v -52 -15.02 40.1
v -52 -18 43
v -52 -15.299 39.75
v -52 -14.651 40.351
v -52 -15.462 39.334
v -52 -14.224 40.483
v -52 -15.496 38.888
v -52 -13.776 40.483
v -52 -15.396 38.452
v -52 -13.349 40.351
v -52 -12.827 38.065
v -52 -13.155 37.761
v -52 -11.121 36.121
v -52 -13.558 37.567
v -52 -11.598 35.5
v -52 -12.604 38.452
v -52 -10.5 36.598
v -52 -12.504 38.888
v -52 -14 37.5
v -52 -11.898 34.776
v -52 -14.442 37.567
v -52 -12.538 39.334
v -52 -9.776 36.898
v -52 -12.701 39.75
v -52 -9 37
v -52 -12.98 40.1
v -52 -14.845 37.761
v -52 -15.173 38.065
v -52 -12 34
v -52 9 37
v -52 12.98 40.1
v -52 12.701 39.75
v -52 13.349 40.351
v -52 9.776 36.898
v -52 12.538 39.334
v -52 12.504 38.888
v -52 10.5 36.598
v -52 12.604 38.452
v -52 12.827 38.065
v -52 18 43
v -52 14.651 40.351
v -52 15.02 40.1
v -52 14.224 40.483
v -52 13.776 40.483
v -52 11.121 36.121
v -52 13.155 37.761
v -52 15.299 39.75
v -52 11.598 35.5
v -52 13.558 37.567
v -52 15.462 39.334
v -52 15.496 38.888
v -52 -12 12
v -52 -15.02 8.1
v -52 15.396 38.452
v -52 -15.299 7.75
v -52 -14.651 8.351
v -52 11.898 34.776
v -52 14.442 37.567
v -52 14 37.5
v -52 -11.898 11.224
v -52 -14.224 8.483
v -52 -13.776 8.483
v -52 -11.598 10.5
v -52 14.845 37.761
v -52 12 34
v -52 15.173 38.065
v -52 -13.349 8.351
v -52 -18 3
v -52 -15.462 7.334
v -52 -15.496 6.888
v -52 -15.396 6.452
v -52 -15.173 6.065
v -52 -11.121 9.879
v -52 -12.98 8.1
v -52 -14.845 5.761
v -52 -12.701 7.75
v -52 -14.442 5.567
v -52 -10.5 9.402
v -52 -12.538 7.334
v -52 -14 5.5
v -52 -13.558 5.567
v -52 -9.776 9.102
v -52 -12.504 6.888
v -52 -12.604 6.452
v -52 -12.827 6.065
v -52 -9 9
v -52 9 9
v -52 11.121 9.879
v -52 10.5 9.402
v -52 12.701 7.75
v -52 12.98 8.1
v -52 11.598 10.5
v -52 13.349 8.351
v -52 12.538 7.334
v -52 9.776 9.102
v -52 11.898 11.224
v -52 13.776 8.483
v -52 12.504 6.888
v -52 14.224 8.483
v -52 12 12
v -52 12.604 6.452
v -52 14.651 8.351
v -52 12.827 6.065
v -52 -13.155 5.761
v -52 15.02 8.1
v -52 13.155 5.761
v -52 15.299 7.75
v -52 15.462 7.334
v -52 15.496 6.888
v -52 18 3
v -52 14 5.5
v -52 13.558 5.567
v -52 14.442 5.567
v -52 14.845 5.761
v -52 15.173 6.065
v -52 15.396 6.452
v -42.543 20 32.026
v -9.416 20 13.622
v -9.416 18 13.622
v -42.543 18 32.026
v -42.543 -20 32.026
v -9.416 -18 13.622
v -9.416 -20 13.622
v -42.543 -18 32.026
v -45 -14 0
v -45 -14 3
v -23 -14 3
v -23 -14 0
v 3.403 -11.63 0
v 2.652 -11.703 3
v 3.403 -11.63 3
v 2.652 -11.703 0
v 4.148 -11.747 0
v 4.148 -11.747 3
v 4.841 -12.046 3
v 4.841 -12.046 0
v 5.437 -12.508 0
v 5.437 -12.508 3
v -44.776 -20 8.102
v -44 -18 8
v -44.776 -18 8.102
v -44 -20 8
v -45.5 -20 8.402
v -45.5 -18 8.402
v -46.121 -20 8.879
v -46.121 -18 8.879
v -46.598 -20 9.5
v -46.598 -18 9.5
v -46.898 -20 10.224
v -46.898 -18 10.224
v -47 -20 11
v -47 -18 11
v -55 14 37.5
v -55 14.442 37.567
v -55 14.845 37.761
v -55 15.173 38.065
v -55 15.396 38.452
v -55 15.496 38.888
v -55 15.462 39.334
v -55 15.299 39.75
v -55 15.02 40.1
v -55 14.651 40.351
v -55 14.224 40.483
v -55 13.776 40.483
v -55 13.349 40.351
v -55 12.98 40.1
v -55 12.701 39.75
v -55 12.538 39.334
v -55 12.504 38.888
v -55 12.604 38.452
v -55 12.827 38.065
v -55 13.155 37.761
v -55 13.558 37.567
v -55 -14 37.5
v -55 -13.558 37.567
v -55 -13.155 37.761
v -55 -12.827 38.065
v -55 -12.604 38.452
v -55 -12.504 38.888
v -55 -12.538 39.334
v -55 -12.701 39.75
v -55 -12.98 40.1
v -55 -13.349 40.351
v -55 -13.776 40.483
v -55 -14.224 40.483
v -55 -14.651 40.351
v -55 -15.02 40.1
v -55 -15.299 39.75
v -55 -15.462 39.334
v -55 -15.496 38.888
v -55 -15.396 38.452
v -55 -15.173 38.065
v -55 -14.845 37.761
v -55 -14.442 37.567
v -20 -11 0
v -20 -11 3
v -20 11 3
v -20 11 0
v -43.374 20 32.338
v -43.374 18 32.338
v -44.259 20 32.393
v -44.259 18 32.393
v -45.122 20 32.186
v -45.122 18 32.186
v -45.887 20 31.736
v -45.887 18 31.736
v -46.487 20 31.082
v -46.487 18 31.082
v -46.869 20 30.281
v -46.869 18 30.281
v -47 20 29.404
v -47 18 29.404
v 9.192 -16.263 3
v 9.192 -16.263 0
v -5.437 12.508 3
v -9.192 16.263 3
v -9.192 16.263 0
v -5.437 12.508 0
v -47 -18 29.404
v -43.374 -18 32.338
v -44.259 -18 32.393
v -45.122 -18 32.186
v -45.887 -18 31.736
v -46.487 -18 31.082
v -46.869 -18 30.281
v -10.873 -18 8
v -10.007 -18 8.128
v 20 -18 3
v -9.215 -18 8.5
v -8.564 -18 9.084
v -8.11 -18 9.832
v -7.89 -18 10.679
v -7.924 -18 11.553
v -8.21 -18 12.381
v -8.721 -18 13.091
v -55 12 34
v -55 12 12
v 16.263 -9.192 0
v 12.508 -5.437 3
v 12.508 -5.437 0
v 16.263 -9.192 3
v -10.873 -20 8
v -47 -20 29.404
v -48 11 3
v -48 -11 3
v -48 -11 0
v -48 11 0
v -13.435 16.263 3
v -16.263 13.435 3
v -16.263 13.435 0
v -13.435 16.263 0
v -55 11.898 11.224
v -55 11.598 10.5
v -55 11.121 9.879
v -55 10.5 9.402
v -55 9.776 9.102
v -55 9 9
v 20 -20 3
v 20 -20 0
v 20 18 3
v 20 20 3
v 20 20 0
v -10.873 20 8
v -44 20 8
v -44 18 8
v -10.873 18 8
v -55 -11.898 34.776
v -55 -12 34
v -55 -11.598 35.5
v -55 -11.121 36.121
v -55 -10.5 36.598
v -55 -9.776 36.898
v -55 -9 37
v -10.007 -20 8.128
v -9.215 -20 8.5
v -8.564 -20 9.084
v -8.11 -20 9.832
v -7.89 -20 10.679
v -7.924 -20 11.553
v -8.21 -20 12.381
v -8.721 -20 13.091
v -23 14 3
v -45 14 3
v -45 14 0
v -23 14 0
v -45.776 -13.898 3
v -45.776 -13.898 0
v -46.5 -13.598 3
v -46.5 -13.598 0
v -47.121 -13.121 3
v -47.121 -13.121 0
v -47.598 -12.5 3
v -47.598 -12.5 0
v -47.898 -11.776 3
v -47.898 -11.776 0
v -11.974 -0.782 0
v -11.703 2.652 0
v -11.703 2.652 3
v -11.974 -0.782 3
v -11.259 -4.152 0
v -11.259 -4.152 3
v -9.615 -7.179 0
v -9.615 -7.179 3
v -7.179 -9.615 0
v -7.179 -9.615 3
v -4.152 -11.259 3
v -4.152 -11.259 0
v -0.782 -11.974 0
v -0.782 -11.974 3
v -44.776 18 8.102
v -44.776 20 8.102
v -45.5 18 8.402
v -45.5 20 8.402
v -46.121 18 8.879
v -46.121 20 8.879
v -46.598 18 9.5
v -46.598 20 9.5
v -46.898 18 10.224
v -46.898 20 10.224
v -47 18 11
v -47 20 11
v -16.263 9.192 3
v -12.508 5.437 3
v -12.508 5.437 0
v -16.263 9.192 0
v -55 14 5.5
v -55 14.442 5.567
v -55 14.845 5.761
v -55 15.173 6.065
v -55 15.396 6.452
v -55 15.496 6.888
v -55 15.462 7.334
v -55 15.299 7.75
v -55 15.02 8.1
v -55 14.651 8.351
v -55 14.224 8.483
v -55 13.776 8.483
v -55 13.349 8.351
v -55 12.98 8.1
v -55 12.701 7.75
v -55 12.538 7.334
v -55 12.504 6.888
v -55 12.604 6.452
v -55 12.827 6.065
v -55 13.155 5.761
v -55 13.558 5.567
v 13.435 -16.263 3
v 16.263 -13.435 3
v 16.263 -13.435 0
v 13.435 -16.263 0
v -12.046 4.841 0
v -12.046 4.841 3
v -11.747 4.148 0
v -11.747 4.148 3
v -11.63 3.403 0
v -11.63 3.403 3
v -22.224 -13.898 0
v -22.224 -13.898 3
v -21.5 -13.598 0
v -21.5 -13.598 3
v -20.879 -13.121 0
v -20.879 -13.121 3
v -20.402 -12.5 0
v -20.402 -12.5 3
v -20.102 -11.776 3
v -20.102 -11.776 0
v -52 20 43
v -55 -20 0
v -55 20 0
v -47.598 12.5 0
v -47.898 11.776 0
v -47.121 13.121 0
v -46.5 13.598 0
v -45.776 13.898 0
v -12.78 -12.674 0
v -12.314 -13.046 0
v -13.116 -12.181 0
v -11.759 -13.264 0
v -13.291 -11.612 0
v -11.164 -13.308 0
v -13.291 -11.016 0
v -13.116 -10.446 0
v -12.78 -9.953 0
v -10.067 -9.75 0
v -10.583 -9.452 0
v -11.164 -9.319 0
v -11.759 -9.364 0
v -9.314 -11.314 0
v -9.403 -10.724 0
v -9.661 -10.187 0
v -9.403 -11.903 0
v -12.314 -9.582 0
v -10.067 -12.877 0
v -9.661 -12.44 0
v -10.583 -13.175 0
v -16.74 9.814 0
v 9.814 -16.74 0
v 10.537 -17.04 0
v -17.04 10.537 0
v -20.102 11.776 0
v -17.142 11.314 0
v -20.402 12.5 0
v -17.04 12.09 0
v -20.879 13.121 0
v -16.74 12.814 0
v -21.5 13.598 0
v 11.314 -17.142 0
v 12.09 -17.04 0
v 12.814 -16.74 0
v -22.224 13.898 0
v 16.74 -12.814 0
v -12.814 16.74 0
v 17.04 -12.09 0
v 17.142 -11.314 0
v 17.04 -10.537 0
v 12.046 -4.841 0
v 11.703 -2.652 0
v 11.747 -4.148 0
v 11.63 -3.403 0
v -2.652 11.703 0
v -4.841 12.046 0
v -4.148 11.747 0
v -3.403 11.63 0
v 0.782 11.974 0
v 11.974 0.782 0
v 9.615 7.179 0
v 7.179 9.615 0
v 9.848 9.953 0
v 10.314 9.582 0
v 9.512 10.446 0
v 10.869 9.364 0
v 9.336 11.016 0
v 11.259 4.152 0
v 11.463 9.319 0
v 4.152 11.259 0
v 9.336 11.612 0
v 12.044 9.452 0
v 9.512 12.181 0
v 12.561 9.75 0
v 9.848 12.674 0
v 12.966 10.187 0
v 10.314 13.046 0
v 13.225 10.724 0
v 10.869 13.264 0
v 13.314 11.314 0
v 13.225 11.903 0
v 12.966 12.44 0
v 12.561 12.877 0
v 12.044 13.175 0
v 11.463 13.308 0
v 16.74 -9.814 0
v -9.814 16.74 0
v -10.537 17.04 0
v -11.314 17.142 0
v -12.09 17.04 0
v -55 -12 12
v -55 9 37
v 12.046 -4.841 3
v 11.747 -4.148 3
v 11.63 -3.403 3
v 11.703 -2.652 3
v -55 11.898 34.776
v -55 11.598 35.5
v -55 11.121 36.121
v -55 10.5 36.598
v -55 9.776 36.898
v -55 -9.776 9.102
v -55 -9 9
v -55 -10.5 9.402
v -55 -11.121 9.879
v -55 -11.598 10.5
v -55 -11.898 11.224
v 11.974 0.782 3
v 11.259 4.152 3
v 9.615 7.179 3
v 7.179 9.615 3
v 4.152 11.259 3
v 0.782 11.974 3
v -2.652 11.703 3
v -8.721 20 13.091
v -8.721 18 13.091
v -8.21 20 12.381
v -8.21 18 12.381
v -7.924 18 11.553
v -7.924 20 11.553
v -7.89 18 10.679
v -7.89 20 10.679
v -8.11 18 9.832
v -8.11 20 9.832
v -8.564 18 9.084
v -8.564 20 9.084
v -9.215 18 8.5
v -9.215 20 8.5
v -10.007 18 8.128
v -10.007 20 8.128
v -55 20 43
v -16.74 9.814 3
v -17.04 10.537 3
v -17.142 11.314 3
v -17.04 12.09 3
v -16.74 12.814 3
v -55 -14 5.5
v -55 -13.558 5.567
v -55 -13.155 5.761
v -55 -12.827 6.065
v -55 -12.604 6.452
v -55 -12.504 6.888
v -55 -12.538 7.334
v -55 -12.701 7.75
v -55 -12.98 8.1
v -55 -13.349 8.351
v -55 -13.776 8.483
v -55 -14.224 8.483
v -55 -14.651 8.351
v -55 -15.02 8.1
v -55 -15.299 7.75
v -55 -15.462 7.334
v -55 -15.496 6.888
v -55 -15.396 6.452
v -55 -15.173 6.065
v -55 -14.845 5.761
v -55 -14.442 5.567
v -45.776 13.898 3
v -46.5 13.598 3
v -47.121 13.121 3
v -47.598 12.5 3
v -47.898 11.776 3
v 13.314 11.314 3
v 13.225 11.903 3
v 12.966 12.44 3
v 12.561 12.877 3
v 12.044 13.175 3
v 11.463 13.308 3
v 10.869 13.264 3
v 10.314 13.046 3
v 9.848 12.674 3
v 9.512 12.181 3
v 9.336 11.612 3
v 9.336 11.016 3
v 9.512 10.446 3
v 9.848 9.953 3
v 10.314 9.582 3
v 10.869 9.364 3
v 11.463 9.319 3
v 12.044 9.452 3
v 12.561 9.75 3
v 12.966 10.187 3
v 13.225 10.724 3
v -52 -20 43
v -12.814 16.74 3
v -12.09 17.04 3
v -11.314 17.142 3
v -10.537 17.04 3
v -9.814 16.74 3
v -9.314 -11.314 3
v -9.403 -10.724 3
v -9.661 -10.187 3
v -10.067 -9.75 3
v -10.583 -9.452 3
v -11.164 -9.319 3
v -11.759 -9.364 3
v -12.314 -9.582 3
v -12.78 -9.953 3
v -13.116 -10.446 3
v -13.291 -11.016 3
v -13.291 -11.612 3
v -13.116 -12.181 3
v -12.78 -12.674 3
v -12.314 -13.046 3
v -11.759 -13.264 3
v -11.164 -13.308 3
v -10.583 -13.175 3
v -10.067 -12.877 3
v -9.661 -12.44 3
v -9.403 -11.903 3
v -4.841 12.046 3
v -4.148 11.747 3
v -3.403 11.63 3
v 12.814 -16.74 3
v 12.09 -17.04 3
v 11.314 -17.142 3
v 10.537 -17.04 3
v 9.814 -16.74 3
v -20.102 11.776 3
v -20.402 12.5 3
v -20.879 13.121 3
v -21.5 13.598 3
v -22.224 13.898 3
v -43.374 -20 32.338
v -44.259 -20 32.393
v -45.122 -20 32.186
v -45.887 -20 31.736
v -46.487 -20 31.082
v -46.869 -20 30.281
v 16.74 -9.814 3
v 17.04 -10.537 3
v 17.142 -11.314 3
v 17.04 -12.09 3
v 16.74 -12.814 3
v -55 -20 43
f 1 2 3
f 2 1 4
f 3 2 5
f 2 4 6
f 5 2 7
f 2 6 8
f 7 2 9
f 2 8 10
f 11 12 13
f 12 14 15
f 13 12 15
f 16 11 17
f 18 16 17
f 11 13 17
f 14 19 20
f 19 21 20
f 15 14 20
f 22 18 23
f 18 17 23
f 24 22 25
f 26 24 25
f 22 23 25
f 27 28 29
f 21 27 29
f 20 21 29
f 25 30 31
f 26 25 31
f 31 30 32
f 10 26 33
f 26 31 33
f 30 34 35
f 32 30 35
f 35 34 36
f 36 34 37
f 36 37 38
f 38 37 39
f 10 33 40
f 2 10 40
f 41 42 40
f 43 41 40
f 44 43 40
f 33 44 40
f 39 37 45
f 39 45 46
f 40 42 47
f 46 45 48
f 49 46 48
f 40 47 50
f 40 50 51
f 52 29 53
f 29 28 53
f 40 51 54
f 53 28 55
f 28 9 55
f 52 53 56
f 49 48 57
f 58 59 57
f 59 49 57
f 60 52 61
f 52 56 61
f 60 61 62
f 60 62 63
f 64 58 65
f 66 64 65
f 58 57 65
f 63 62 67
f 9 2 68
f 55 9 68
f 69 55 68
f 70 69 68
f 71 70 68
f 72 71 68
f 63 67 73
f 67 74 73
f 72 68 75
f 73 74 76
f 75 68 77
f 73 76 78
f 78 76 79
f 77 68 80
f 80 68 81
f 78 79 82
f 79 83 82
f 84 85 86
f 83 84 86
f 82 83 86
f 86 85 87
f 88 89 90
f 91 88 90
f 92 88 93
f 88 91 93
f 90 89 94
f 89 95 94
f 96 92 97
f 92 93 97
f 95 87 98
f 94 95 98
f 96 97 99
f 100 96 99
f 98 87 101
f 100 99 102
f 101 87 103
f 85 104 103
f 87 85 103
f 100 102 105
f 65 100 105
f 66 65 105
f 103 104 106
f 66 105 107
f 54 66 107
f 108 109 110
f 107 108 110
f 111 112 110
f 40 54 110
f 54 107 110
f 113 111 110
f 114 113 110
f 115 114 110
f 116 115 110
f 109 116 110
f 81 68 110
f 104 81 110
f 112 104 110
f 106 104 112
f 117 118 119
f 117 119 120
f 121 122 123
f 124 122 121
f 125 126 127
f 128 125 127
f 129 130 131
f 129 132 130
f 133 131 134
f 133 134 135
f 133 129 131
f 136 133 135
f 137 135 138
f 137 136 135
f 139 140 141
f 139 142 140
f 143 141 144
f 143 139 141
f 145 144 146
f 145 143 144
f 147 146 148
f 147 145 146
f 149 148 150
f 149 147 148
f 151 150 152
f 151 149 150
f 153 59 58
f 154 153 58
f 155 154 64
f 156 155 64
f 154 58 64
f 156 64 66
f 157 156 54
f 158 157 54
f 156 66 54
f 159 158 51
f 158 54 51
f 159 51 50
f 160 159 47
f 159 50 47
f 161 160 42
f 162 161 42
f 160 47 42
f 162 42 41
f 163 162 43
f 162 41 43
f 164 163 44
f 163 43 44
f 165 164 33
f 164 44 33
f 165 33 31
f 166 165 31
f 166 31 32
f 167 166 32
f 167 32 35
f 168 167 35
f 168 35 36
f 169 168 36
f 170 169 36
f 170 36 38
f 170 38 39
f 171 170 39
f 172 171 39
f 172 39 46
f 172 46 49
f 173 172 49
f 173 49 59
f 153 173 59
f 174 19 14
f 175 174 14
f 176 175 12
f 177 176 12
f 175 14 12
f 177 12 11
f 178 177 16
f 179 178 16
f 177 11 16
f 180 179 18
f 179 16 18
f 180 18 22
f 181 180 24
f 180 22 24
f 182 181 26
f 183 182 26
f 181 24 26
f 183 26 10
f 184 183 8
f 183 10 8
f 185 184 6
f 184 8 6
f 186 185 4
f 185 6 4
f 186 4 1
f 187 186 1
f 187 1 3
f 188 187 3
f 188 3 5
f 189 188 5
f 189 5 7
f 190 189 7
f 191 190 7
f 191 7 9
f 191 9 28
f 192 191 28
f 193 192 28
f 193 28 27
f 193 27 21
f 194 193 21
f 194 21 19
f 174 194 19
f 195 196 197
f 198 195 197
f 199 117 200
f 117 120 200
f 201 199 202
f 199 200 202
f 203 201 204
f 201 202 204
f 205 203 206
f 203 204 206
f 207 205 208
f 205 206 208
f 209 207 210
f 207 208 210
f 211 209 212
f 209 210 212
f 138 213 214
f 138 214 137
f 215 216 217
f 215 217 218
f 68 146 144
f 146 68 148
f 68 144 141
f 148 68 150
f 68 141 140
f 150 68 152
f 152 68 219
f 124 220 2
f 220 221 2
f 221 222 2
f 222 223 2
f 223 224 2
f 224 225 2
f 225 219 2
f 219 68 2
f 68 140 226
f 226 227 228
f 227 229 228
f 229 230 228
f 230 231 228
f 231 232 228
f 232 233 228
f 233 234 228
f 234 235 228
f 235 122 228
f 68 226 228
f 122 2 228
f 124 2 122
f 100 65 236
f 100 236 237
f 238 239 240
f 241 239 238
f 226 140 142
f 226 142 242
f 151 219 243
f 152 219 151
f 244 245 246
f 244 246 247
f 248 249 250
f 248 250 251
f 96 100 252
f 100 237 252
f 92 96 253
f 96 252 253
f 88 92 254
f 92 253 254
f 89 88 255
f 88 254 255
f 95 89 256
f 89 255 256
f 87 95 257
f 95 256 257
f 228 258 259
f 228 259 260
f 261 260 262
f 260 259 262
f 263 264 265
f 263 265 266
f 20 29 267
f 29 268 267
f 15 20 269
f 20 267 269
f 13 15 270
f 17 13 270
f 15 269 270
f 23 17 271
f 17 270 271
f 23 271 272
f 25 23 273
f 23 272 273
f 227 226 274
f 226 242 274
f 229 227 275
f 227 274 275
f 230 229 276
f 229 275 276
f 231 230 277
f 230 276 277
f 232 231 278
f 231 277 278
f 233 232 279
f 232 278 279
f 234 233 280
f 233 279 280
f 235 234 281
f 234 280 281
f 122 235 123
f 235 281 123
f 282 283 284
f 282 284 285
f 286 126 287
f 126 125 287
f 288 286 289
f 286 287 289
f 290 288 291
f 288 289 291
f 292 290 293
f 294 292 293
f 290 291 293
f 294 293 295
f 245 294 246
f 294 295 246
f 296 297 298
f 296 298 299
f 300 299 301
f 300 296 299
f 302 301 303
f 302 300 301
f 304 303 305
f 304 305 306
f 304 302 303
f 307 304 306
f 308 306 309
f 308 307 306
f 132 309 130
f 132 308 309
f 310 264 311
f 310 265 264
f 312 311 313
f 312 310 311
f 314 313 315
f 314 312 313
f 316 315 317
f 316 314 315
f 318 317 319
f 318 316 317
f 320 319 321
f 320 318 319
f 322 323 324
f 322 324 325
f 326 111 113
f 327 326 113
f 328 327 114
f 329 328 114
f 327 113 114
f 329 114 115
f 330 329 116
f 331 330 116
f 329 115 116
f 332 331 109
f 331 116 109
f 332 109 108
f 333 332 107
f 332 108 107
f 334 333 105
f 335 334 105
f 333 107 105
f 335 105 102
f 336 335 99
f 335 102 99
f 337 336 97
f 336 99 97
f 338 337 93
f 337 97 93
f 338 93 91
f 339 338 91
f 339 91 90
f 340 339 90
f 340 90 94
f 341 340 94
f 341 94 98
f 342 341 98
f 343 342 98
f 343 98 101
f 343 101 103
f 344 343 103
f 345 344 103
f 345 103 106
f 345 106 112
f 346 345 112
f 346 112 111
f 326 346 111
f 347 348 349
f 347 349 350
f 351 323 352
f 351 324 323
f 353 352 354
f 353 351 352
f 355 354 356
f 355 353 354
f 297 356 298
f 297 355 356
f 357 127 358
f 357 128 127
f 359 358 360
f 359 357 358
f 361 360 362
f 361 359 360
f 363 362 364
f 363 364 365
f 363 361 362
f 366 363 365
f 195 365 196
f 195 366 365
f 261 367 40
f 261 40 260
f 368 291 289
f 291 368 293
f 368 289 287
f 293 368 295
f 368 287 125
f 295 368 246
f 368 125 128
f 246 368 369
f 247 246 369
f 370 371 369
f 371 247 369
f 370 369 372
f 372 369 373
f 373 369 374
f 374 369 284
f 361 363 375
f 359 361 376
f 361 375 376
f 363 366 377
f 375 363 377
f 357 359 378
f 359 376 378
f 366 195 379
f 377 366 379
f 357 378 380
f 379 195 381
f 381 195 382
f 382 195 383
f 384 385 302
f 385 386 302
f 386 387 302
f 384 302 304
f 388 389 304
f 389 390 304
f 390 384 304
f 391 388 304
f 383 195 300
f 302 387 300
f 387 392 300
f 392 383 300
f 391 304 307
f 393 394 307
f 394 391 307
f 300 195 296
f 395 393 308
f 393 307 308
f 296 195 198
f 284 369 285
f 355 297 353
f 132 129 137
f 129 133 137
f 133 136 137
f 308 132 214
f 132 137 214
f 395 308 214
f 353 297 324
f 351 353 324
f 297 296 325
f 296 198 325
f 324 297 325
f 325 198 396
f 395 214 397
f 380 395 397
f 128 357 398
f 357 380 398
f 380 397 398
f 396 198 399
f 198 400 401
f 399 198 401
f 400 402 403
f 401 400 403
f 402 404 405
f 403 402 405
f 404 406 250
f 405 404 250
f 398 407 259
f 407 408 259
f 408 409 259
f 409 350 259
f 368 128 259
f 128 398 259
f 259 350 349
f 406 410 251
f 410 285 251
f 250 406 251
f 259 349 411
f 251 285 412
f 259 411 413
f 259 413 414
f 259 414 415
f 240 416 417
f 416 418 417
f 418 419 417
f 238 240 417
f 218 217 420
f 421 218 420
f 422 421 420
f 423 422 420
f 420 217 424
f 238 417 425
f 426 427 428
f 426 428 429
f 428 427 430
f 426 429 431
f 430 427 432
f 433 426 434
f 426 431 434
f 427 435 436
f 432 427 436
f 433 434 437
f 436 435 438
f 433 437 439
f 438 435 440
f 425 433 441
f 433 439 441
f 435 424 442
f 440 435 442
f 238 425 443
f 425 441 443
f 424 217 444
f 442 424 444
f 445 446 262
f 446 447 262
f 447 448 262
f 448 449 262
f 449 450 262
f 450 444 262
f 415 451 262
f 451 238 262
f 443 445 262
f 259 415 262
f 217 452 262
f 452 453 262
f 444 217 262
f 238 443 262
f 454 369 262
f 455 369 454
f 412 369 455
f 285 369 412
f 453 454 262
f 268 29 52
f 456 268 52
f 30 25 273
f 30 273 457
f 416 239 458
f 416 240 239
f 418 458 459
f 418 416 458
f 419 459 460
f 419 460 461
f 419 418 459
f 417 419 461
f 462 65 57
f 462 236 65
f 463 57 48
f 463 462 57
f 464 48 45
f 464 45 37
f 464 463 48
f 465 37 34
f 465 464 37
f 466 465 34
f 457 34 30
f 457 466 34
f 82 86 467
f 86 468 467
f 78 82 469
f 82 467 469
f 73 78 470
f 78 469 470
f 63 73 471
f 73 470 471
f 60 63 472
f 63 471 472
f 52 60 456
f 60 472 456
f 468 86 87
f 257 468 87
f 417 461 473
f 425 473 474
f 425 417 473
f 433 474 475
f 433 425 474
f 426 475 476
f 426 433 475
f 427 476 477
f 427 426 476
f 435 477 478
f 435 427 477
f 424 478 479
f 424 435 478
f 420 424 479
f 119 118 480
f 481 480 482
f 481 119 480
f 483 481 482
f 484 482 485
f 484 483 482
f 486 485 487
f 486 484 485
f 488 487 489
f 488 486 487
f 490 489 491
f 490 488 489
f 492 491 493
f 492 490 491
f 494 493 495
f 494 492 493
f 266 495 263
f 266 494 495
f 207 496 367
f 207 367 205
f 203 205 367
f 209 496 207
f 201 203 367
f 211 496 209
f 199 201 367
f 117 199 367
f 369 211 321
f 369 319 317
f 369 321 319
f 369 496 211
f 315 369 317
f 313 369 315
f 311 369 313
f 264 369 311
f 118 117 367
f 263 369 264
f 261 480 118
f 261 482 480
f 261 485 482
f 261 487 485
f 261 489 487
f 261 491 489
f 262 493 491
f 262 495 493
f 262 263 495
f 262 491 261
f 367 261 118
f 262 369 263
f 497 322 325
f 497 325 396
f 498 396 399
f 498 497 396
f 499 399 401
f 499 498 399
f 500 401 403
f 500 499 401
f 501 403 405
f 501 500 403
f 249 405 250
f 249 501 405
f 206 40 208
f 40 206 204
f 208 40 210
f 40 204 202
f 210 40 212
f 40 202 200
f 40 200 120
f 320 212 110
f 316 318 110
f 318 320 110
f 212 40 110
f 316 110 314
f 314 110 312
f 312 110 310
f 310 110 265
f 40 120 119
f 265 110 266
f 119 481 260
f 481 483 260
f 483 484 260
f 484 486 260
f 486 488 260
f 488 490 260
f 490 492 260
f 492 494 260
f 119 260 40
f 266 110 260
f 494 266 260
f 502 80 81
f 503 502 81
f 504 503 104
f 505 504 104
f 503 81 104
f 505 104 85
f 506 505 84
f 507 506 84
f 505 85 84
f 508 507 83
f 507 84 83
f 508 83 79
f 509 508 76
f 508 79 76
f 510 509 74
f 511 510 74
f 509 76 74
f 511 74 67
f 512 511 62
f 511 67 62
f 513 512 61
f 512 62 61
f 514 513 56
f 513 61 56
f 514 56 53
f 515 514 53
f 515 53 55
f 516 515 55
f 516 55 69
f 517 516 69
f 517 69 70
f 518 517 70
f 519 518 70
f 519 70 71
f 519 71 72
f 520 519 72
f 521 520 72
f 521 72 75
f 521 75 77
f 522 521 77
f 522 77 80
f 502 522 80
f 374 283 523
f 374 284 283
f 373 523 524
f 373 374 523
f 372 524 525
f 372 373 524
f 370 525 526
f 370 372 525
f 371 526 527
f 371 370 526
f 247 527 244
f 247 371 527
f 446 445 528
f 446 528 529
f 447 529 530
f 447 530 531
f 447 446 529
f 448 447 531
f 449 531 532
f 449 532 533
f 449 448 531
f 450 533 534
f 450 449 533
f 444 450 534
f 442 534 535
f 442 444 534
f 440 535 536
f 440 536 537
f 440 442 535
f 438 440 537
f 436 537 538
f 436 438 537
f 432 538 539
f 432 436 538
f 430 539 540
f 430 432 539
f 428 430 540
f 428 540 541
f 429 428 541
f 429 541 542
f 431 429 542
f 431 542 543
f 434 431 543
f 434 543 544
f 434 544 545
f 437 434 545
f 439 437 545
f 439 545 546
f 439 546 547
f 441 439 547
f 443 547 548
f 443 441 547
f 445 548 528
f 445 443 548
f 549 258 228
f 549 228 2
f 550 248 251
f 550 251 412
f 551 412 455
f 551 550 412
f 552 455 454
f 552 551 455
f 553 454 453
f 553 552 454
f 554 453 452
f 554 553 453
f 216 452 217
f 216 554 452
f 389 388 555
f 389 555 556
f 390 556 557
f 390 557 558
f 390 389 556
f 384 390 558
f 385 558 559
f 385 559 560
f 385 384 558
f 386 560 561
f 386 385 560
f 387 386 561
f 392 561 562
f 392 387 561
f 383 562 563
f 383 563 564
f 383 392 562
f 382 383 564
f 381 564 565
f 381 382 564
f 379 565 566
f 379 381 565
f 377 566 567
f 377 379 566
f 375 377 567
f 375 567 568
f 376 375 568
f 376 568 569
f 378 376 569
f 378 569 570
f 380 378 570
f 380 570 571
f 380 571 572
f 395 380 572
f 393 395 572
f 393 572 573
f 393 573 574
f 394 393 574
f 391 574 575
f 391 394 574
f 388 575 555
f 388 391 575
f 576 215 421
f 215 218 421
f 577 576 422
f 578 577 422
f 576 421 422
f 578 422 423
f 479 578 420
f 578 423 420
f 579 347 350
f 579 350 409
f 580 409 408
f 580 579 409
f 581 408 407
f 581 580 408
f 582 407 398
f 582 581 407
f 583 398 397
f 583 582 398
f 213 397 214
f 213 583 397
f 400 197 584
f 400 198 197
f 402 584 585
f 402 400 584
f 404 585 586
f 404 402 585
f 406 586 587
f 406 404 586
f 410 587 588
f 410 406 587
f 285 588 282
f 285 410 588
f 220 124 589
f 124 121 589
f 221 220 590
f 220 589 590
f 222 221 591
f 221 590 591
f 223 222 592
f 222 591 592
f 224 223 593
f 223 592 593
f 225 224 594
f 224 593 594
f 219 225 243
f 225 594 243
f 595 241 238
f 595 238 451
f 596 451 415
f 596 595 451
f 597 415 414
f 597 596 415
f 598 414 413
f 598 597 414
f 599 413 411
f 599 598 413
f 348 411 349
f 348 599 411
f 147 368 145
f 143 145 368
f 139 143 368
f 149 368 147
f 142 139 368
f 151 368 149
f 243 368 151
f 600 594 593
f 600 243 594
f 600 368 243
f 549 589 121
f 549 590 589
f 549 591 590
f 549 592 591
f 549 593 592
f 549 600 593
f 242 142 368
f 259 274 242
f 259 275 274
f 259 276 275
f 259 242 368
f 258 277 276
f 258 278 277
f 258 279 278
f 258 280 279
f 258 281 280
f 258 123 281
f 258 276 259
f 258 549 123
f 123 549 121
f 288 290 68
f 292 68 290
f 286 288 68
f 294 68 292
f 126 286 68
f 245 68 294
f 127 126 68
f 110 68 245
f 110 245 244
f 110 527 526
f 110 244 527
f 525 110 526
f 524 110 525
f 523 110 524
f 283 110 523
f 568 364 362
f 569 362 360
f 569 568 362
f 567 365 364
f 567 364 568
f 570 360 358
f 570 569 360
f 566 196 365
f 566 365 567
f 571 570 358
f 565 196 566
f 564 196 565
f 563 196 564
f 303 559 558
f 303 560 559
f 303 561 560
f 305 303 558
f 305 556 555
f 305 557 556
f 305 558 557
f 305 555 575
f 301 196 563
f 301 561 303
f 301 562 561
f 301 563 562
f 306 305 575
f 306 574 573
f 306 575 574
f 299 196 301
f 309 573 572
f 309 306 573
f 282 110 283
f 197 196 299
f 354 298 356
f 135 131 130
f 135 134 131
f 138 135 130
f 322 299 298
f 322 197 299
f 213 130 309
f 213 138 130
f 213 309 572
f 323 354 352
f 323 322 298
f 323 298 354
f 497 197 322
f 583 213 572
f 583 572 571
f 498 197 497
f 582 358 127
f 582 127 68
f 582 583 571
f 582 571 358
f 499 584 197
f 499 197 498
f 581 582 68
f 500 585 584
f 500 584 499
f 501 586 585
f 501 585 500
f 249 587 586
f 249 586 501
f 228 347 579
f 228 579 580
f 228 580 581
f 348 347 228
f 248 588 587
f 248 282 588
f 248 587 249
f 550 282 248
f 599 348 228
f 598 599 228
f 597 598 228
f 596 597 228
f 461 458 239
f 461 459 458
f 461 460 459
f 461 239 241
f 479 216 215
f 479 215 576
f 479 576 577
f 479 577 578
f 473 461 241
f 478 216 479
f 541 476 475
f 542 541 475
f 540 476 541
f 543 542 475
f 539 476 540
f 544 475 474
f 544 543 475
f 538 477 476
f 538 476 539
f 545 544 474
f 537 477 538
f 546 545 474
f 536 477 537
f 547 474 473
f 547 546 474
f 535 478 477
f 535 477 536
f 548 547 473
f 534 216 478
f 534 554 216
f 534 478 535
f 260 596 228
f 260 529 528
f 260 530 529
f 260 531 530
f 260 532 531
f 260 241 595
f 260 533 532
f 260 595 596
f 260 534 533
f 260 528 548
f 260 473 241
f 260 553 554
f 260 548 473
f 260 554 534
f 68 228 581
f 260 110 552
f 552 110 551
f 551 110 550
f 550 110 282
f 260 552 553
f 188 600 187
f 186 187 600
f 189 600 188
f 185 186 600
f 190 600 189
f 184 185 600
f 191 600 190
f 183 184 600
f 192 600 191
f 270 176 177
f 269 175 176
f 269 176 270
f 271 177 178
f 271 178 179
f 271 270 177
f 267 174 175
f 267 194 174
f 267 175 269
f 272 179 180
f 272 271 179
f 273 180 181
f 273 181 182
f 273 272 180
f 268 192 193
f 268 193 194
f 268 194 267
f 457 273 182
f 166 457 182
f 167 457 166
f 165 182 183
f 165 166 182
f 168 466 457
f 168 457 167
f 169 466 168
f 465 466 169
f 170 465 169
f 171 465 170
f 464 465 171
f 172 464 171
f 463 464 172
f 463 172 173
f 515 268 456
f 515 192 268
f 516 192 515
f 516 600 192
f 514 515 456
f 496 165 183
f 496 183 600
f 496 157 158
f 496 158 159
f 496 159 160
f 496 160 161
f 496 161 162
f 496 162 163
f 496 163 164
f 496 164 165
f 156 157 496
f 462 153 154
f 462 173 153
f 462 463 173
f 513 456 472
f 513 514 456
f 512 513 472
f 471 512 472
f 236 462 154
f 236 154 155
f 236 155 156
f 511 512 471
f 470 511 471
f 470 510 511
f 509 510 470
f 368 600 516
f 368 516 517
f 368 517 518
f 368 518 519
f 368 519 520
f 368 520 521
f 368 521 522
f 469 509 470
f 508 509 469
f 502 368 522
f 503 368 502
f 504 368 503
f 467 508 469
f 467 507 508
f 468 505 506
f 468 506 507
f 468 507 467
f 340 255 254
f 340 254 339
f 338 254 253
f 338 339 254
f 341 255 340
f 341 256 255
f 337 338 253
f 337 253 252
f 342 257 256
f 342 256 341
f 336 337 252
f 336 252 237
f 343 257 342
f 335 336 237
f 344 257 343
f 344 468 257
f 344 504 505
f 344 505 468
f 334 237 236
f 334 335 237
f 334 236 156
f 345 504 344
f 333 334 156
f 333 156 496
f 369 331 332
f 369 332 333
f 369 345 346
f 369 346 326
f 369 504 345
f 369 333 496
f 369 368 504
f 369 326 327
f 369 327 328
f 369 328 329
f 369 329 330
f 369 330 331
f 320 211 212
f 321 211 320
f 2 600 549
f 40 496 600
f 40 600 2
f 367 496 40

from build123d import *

# Parameters (mm, degrees)
SKETCH_1_W          = 40
SKETCH_1_H          = 40
SKETCH_1_R          = 2
SKETCH_1_R_2        = 12
EXTRUDE_1_DEPTH     = 3
SKETCH_2_W          = 35
SKETCH_2_H          = 40
EXTRUDE_2_DEPTH     = 3
SKETCH_3_W          = 3
SKETCH_3_H          = 40
EXTRUDE_3_DEPTH     = 40
EXTRUDE_4_DEPTH     = 2
EXTRUDE_5_DEPTH     = 2
SKETCH_6_R          = 1.5
SKETCH_6_W          = 28
SKETCH_6_H          = 24
CUT_EXTRUDE_1_DEPTH = 12
FILLET_1_R          = 3
SKETCH_7_W          = 28
SKETCH_7_H          = 28
CUT_EXTRUDE_2_DEPTH = 12
FILLET_2_R          = 3
CUT_EXTRUDE_3_DEPTH = 49
FILLET_3_R          = 3
FILLET_4_R          = 3
CUT_EXTRUDE_4_DEPTH = 10
FILLET_5_R          = 3


with BuildPart() as part:
    # 草图1 → 凸台-拉伸1 (new body)
    with BuildSketch(Plane.XY):
        Rectangle(SKETCH_1_W, SKETCH_1_H)
        with Locations((11.313708499, 11.313708499)):
            Circle(SKETCH_1_R, mode=Mode.SUBTRACT)
        with Locations((11.313708499, -11.313708499)):
            Circle(SKETCH_1_R, mode=Mode.SUBTRACT)
        with Locations((-11.313708499, -11.313708499)):
            Circle(SKETCH_1_R, mode=Mode.SUBTRACT)
        with Locations((-11.313708499, 11.313708499)):
            Circle(SKETCH_1_R, mode=Mode.SUBTRACT)
        Circle(SKETCH_1_R_2, mode=Mode.SUBTRACT)
    extrude(amount=EXTRUDE_1_DEPTH)

    # 草图2 → 凸台-拉伸2 (add)
    with BuildSketch(Plane.XY.offset(3)):
        with Locations((-37.5, 0)):
            Rectangle(SKETCH_2_W, SKETCH_2_H)
    extrude(amount=-EXTRUDE_2_DEPTH)

    # 草图3 → 凸台-拉伸3 (add)
    with BuildSketch(Plane.XY.offset(3)):
        with Locations((-53.5, 0)):
            Rectangle(SKETCH_3_W, SKETCH_3_H)
    extrude(amount=EXTRUDE_3_DEPTH)

    # 草图4 → 凸台-拉伸4 (add)
    with BuildSketch(Plane(origin=(0, 20, 0), x_dir=(1, 0, 0), z_dir=(0, 1, 0))):
        Polygon((-52, -43), (20, -3), (-52, -3), align=None)
    extrude(amount=-EXTRUDE_4_DEPTH)

    # 草图5 → 凸台-拉伸5 (add)
    with BuildSketch(Plane.XZ.offset(20)):
        Polygon((-52, 43), (-52, 3), (20, 3), align=None)
    extrude(amount=-EXTRUDE_5_DEPTH)

    # 草图6 → 切除-拉伸1 (cut)
    with BuildSketch(Plane(origin=(-52, 0, 0), x_dir=(0, 0, -1), z_dir=(1, 0, 0))):
        with Locations((-39, 14)):
            Circle(SKETCH_6_R)
        with Locations((-7, 14)):
            Circle(SKETCH_6_R)
        with Locations((-7, -14)):
            Circle(SKETCH_6_R)
        with Locations((-39, -14)):
            Circle(SKETCH_6_R)
        with Locations((-23, 0)):
            Rectangle(SKETCH_6_W, SKETCH_6_H)
    extrude(amount=-CUT_EXTRUDE_1_DEPTH, mode=Mode.SUBTRACT)

    # 圆角1
    fillet_1_edges = [part.edges().sort_by_distance(p)[0] for p in [
        (-53.5, -12, 37),
        (-53.5, 12, 37),
        (-53.5, 12, 9),
        (-53.5, -12, 9),
    ]]
    fillet(fillet_1_edges, radius=FILLET_1_R)

    # 草图7 → 切除-拉伸2 (cut)
    with BuildSketch(Plane.XY.offset(3)):
        with Locations((-34, 0)):
            Rectangle(SKETCH_7_W, SKETCH_7_H)
    extrude(amount=-CUT_EXTRUDE_2_DEPTH, mode=Mode.SUBTRACT)

    # 圆角2
    fillet_2_edges = [part.edges().sort_by_distance(p)[0] for p in [
        (-20, 14, 1.5),
        (-20, -14, 1.5),
        (-48, -14, 1.5),
        (-48, 14, 1.5),
    ]]
    fillet(fillet_2_edges, radius=FILLET_2_R)

    # 草图8 → 切除-拉伸3 (cut)
    with BuildSketch(Plane(origin=(0, 20, 0), x_dir=(1, 0, 0), z_dir=(0, 1, 0))):
        Polygon((-47, -34.502427699), (-47, -8), (0.704369859, -8), align=None)
    extrude(amount=-CUT_EXTRUDE_3_DEPTH, mode=Mode.SUBTRACT)

    # 圆角3
    fillet_3_edges = [part.edges().sort_by_distance(p)[0] for p in [
        (0.704369859, 19, 8),
        (-47, 19, 34.502427699),
        (-47, 19, 8),
    ]]
    fillet(fillet_3_edges, radius=FILLET_3_R)

    # 圆角4
    fillet_4_edges = [part.edges().sort_by_distance(p)[0] for p in [
        (0.704369859, -19, 8),
        (-47, -19, 34.502427699),
        (-47, -19, 8),
    ]]
    fillet(fillet_4_edges, radius=FILLET_4_R)

    # 草图9 → 切除-拉伸4 (cut)
    with BuildSketch(Plane.XY.offset(3)):
        with BuildLine():
            Line((-4.949747468, 12.02081528), (-1.998451999, 9.069519811))
            Line((-1.998451999, 9.069519811), (12.02081528, -4.949747468))
            Line((12.02081528, -4.949747468), (16.263455967, -9.192388155))
            ThreePointArc((16.263455967, -9.192388155), (17.142135624, -11.313708499), (16.263455967, -13.435028843))
            Line((16.263455967, -13.435028843), (13.435028843, -16.263455967))
            ThreePointArc((13.435028843, -16.263455967), (11.313708499, -17.142135624), (9.192388155, -16.263455967))
            Line((9.192388155, -16.263455967), (4.949747468, -12.02081528))
            Line((4.949747468, -12.02081528), (-9.069519811, 1.998451999))
            Line((-9.069519811, 1.998451999), (-12.02081528, 4.949747468))
            Line((-12.02081528, 4.949747468), (-16.263455967, 9.192388155))
            ThreePointArc((-16.263455967, 9.192388155), (-17.142135624, 11.313708499), (-16.263455967, 13.435028843))
            Line((-16.263455967, 13.435028843), (-13.435028843, 16.263455967))
            ThreePointArc((-13.435028843, 16.263455967), (-11.313708499, 17.142135624), (-9.192388155, 16.263455967))
            Line((-9.192388155, 16.263455967), (-4.949747468, 12.02081528))
        make_face()
    extrude(amount=-CUT_EXTRUDE_4_DEPTH, mode=Mode.SUBTRACT)

    # 圆角5
    fillet_5_edges = [part.edges().sort_by_distance(p)[0] for p in [
        (4.178090404, -11.249158216, 1.5),
        (-11.249158216, 4.178090404, 1.5),
        (-4.178090404, 11.249158216, 1.5),
        (11.249158216, -4.178090404, 1.5),
    ]]
    fillet(fillet_5_edges, radius=FILLET_5_R)


solid = part.part
